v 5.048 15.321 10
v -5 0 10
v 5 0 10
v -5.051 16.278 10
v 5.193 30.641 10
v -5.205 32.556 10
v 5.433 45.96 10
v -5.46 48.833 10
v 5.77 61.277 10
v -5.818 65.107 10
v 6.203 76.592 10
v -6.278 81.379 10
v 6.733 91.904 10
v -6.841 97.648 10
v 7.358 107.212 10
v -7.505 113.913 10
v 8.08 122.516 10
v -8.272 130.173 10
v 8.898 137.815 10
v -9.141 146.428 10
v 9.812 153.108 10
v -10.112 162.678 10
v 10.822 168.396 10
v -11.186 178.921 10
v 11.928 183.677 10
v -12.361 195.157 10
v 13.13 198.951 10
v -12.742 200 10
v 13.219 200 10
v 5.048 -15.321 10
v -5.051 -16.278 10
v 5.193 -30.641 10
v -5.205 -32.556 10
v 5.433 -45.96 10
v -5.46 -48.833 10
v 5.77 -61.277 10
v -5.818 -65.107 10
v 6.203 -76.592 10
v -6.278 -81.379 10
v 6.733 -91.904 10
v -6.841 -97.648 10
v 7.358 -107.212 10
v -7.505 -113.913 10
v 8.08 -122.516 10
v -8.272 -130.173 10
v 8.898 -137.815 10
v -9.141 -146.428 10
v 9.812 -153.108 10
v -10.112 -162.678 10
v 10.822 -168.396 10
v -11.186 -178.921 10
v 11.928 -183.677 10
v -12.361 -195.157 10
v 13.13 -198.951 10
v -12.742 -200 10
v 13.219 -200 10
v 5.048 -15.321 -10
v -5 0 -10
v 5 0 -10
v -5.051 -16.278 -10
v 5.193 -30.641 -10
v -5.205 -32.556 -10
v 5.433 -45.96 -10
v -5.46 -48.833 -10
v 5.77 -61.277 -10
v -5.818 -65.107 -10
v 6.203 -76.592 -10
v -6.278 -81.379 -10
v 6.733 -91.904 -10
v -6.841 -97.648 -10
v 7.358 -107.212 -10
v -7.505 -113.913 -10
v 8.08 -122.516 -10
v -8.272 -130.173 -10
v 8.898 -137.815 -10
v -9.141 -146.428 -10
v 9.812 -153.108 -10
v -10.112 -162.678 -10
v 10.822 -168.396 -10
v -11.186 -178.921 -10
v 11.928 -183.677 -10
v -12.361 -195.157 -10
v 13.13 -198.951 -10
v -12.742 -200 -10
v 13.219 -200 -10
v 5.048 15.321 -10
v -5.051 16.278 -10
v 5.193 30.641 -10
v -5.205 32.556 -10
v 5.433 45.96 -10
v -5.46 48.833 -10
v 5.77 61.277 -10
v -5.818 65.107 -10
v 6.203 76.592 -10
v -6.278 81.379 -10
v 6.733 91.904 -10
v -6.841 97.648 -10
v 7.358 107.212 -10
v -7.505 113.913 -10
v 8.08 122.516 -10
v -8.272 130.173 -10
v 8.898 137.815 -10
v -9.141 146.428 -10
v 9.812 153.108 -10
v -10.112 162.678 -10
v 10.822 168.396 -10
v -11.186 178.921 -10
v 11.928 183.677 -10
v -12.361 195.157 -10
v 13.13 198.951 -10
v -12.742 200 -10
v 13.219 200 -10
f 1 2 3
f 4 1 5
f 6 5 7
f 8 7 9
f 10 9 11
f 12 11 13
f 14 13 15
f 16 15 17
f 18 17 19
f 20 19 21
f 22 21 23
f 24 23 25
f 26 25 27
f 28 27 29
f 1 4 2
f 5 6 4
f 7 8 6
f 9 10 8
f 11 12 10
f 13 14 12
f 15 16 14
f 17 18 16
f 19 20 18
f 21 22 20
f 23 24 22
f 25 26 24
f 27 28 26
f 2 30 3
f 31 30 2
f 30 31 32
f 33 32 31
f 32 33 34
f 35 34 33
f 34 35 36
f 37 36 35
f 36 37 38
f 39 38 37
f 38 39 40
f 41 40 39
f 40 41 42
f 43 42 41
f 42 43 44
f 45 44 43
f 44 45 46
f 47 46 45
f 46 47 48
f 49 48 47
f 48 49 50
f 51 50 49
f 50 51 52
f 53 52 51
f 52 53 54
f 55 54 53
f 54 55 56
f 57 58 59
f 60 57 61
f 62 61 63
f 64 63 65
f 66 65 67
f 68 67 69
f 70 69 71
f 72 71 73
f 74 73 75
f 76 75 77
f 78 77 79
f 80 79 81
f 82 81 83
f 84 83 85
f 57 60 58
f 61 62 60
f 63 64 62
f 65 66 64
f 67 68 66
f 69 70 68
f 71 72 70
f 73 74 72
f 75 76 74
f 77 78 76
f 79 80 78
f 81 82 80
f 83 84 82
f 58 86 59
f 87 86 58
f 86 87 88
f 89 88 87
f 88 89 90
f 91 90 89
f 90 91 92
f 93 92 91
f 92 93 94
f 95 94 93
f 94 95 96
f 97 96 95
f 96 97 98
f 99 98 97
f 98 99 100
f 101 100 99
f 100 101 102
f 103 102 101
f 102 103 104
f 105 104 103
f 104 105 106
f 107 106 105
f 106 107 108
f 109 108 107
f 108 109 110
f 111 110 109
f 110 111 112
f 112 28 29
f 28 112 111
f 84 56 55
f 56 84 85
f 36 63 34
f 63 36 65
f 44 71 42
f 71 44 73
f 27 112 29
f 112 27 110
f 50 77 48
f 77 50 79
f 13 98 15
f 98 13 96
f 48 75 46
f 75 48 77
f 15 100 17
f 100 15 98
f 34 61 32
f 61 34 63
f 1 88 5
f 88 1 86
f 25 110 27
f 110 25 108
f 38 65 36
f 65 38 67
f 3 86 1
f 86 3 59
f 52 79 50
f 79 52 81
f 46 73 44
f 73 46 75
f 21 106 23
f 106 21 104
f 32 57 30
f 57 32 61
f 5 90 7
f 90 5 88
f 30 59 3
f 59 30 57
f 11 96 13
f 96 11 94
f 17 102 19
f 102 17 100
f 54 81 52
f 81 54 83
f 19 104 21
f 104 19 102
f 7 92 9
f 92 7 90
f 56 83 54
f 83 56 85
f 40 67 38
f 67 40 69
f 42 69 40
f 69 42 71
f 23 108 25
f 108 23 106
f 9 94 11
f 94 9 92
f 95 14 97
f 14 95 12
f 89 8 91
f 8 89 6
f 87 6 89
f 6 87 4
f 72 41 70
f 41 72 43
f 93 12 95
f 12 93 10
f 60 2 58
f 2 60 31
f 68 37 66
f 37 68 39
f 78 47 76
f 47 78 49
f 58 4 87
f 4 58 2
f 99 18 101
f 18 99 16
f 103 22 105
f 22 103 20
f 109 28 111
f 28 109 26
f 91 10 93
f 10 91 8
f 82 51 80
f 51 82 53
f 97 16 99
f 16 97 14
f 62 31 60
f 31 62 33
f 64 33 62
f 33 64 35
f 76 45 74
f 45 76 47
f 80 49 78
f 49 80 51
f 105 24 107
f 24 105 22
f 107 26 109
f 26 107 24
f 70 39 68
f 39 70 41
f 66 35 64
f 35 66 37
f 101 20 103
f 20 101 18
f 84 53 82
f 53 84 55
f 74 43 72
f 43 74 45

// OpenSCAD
$fn = 1000;
module getBar(rad1, rad2, height = 20.0, width = 40.0, length = 400.0){
    
    difference(){
        cube([width, length, height], true);
        translate([0,0,-1])
            rotate([0,0,90])
                text("8/-8.5", .5, halign = "center", valign = "center");
        getCircle(rad1, height, width);
        getCircle(rad2, height, width, true);
    }
}

module getCircle(rad, height, width, reverse = false) {
    if(reverse){
        translate([-getCircleOffset(rad, width),0,-height/2])
            cylinder(height, r = rad, true);
    } else { 
        translate([getCircleOffset(rad, width),0,-height/2])
            cylinder(height, r = rad, true);
    }
}

function getCircleOffset(rad, width) = rad + width / 8;
function getCMFromFeet(ft) = ft * 304.8;

radius1 = getCMFromFeet(7);
radius2 = getCMFromFeet(7.5);
radius3 = getCMFromFeet(8);
radius4 = getCMFromFeet(8.5);
radius5 = getCMFromFeet(9);
radius6 = getCMFromFeet(9.5);

//feetCMRatio = 30.48;

barLength = 400;
getBar(radius3, radius4);


//cylinder(h = 2, r= 40, true);
